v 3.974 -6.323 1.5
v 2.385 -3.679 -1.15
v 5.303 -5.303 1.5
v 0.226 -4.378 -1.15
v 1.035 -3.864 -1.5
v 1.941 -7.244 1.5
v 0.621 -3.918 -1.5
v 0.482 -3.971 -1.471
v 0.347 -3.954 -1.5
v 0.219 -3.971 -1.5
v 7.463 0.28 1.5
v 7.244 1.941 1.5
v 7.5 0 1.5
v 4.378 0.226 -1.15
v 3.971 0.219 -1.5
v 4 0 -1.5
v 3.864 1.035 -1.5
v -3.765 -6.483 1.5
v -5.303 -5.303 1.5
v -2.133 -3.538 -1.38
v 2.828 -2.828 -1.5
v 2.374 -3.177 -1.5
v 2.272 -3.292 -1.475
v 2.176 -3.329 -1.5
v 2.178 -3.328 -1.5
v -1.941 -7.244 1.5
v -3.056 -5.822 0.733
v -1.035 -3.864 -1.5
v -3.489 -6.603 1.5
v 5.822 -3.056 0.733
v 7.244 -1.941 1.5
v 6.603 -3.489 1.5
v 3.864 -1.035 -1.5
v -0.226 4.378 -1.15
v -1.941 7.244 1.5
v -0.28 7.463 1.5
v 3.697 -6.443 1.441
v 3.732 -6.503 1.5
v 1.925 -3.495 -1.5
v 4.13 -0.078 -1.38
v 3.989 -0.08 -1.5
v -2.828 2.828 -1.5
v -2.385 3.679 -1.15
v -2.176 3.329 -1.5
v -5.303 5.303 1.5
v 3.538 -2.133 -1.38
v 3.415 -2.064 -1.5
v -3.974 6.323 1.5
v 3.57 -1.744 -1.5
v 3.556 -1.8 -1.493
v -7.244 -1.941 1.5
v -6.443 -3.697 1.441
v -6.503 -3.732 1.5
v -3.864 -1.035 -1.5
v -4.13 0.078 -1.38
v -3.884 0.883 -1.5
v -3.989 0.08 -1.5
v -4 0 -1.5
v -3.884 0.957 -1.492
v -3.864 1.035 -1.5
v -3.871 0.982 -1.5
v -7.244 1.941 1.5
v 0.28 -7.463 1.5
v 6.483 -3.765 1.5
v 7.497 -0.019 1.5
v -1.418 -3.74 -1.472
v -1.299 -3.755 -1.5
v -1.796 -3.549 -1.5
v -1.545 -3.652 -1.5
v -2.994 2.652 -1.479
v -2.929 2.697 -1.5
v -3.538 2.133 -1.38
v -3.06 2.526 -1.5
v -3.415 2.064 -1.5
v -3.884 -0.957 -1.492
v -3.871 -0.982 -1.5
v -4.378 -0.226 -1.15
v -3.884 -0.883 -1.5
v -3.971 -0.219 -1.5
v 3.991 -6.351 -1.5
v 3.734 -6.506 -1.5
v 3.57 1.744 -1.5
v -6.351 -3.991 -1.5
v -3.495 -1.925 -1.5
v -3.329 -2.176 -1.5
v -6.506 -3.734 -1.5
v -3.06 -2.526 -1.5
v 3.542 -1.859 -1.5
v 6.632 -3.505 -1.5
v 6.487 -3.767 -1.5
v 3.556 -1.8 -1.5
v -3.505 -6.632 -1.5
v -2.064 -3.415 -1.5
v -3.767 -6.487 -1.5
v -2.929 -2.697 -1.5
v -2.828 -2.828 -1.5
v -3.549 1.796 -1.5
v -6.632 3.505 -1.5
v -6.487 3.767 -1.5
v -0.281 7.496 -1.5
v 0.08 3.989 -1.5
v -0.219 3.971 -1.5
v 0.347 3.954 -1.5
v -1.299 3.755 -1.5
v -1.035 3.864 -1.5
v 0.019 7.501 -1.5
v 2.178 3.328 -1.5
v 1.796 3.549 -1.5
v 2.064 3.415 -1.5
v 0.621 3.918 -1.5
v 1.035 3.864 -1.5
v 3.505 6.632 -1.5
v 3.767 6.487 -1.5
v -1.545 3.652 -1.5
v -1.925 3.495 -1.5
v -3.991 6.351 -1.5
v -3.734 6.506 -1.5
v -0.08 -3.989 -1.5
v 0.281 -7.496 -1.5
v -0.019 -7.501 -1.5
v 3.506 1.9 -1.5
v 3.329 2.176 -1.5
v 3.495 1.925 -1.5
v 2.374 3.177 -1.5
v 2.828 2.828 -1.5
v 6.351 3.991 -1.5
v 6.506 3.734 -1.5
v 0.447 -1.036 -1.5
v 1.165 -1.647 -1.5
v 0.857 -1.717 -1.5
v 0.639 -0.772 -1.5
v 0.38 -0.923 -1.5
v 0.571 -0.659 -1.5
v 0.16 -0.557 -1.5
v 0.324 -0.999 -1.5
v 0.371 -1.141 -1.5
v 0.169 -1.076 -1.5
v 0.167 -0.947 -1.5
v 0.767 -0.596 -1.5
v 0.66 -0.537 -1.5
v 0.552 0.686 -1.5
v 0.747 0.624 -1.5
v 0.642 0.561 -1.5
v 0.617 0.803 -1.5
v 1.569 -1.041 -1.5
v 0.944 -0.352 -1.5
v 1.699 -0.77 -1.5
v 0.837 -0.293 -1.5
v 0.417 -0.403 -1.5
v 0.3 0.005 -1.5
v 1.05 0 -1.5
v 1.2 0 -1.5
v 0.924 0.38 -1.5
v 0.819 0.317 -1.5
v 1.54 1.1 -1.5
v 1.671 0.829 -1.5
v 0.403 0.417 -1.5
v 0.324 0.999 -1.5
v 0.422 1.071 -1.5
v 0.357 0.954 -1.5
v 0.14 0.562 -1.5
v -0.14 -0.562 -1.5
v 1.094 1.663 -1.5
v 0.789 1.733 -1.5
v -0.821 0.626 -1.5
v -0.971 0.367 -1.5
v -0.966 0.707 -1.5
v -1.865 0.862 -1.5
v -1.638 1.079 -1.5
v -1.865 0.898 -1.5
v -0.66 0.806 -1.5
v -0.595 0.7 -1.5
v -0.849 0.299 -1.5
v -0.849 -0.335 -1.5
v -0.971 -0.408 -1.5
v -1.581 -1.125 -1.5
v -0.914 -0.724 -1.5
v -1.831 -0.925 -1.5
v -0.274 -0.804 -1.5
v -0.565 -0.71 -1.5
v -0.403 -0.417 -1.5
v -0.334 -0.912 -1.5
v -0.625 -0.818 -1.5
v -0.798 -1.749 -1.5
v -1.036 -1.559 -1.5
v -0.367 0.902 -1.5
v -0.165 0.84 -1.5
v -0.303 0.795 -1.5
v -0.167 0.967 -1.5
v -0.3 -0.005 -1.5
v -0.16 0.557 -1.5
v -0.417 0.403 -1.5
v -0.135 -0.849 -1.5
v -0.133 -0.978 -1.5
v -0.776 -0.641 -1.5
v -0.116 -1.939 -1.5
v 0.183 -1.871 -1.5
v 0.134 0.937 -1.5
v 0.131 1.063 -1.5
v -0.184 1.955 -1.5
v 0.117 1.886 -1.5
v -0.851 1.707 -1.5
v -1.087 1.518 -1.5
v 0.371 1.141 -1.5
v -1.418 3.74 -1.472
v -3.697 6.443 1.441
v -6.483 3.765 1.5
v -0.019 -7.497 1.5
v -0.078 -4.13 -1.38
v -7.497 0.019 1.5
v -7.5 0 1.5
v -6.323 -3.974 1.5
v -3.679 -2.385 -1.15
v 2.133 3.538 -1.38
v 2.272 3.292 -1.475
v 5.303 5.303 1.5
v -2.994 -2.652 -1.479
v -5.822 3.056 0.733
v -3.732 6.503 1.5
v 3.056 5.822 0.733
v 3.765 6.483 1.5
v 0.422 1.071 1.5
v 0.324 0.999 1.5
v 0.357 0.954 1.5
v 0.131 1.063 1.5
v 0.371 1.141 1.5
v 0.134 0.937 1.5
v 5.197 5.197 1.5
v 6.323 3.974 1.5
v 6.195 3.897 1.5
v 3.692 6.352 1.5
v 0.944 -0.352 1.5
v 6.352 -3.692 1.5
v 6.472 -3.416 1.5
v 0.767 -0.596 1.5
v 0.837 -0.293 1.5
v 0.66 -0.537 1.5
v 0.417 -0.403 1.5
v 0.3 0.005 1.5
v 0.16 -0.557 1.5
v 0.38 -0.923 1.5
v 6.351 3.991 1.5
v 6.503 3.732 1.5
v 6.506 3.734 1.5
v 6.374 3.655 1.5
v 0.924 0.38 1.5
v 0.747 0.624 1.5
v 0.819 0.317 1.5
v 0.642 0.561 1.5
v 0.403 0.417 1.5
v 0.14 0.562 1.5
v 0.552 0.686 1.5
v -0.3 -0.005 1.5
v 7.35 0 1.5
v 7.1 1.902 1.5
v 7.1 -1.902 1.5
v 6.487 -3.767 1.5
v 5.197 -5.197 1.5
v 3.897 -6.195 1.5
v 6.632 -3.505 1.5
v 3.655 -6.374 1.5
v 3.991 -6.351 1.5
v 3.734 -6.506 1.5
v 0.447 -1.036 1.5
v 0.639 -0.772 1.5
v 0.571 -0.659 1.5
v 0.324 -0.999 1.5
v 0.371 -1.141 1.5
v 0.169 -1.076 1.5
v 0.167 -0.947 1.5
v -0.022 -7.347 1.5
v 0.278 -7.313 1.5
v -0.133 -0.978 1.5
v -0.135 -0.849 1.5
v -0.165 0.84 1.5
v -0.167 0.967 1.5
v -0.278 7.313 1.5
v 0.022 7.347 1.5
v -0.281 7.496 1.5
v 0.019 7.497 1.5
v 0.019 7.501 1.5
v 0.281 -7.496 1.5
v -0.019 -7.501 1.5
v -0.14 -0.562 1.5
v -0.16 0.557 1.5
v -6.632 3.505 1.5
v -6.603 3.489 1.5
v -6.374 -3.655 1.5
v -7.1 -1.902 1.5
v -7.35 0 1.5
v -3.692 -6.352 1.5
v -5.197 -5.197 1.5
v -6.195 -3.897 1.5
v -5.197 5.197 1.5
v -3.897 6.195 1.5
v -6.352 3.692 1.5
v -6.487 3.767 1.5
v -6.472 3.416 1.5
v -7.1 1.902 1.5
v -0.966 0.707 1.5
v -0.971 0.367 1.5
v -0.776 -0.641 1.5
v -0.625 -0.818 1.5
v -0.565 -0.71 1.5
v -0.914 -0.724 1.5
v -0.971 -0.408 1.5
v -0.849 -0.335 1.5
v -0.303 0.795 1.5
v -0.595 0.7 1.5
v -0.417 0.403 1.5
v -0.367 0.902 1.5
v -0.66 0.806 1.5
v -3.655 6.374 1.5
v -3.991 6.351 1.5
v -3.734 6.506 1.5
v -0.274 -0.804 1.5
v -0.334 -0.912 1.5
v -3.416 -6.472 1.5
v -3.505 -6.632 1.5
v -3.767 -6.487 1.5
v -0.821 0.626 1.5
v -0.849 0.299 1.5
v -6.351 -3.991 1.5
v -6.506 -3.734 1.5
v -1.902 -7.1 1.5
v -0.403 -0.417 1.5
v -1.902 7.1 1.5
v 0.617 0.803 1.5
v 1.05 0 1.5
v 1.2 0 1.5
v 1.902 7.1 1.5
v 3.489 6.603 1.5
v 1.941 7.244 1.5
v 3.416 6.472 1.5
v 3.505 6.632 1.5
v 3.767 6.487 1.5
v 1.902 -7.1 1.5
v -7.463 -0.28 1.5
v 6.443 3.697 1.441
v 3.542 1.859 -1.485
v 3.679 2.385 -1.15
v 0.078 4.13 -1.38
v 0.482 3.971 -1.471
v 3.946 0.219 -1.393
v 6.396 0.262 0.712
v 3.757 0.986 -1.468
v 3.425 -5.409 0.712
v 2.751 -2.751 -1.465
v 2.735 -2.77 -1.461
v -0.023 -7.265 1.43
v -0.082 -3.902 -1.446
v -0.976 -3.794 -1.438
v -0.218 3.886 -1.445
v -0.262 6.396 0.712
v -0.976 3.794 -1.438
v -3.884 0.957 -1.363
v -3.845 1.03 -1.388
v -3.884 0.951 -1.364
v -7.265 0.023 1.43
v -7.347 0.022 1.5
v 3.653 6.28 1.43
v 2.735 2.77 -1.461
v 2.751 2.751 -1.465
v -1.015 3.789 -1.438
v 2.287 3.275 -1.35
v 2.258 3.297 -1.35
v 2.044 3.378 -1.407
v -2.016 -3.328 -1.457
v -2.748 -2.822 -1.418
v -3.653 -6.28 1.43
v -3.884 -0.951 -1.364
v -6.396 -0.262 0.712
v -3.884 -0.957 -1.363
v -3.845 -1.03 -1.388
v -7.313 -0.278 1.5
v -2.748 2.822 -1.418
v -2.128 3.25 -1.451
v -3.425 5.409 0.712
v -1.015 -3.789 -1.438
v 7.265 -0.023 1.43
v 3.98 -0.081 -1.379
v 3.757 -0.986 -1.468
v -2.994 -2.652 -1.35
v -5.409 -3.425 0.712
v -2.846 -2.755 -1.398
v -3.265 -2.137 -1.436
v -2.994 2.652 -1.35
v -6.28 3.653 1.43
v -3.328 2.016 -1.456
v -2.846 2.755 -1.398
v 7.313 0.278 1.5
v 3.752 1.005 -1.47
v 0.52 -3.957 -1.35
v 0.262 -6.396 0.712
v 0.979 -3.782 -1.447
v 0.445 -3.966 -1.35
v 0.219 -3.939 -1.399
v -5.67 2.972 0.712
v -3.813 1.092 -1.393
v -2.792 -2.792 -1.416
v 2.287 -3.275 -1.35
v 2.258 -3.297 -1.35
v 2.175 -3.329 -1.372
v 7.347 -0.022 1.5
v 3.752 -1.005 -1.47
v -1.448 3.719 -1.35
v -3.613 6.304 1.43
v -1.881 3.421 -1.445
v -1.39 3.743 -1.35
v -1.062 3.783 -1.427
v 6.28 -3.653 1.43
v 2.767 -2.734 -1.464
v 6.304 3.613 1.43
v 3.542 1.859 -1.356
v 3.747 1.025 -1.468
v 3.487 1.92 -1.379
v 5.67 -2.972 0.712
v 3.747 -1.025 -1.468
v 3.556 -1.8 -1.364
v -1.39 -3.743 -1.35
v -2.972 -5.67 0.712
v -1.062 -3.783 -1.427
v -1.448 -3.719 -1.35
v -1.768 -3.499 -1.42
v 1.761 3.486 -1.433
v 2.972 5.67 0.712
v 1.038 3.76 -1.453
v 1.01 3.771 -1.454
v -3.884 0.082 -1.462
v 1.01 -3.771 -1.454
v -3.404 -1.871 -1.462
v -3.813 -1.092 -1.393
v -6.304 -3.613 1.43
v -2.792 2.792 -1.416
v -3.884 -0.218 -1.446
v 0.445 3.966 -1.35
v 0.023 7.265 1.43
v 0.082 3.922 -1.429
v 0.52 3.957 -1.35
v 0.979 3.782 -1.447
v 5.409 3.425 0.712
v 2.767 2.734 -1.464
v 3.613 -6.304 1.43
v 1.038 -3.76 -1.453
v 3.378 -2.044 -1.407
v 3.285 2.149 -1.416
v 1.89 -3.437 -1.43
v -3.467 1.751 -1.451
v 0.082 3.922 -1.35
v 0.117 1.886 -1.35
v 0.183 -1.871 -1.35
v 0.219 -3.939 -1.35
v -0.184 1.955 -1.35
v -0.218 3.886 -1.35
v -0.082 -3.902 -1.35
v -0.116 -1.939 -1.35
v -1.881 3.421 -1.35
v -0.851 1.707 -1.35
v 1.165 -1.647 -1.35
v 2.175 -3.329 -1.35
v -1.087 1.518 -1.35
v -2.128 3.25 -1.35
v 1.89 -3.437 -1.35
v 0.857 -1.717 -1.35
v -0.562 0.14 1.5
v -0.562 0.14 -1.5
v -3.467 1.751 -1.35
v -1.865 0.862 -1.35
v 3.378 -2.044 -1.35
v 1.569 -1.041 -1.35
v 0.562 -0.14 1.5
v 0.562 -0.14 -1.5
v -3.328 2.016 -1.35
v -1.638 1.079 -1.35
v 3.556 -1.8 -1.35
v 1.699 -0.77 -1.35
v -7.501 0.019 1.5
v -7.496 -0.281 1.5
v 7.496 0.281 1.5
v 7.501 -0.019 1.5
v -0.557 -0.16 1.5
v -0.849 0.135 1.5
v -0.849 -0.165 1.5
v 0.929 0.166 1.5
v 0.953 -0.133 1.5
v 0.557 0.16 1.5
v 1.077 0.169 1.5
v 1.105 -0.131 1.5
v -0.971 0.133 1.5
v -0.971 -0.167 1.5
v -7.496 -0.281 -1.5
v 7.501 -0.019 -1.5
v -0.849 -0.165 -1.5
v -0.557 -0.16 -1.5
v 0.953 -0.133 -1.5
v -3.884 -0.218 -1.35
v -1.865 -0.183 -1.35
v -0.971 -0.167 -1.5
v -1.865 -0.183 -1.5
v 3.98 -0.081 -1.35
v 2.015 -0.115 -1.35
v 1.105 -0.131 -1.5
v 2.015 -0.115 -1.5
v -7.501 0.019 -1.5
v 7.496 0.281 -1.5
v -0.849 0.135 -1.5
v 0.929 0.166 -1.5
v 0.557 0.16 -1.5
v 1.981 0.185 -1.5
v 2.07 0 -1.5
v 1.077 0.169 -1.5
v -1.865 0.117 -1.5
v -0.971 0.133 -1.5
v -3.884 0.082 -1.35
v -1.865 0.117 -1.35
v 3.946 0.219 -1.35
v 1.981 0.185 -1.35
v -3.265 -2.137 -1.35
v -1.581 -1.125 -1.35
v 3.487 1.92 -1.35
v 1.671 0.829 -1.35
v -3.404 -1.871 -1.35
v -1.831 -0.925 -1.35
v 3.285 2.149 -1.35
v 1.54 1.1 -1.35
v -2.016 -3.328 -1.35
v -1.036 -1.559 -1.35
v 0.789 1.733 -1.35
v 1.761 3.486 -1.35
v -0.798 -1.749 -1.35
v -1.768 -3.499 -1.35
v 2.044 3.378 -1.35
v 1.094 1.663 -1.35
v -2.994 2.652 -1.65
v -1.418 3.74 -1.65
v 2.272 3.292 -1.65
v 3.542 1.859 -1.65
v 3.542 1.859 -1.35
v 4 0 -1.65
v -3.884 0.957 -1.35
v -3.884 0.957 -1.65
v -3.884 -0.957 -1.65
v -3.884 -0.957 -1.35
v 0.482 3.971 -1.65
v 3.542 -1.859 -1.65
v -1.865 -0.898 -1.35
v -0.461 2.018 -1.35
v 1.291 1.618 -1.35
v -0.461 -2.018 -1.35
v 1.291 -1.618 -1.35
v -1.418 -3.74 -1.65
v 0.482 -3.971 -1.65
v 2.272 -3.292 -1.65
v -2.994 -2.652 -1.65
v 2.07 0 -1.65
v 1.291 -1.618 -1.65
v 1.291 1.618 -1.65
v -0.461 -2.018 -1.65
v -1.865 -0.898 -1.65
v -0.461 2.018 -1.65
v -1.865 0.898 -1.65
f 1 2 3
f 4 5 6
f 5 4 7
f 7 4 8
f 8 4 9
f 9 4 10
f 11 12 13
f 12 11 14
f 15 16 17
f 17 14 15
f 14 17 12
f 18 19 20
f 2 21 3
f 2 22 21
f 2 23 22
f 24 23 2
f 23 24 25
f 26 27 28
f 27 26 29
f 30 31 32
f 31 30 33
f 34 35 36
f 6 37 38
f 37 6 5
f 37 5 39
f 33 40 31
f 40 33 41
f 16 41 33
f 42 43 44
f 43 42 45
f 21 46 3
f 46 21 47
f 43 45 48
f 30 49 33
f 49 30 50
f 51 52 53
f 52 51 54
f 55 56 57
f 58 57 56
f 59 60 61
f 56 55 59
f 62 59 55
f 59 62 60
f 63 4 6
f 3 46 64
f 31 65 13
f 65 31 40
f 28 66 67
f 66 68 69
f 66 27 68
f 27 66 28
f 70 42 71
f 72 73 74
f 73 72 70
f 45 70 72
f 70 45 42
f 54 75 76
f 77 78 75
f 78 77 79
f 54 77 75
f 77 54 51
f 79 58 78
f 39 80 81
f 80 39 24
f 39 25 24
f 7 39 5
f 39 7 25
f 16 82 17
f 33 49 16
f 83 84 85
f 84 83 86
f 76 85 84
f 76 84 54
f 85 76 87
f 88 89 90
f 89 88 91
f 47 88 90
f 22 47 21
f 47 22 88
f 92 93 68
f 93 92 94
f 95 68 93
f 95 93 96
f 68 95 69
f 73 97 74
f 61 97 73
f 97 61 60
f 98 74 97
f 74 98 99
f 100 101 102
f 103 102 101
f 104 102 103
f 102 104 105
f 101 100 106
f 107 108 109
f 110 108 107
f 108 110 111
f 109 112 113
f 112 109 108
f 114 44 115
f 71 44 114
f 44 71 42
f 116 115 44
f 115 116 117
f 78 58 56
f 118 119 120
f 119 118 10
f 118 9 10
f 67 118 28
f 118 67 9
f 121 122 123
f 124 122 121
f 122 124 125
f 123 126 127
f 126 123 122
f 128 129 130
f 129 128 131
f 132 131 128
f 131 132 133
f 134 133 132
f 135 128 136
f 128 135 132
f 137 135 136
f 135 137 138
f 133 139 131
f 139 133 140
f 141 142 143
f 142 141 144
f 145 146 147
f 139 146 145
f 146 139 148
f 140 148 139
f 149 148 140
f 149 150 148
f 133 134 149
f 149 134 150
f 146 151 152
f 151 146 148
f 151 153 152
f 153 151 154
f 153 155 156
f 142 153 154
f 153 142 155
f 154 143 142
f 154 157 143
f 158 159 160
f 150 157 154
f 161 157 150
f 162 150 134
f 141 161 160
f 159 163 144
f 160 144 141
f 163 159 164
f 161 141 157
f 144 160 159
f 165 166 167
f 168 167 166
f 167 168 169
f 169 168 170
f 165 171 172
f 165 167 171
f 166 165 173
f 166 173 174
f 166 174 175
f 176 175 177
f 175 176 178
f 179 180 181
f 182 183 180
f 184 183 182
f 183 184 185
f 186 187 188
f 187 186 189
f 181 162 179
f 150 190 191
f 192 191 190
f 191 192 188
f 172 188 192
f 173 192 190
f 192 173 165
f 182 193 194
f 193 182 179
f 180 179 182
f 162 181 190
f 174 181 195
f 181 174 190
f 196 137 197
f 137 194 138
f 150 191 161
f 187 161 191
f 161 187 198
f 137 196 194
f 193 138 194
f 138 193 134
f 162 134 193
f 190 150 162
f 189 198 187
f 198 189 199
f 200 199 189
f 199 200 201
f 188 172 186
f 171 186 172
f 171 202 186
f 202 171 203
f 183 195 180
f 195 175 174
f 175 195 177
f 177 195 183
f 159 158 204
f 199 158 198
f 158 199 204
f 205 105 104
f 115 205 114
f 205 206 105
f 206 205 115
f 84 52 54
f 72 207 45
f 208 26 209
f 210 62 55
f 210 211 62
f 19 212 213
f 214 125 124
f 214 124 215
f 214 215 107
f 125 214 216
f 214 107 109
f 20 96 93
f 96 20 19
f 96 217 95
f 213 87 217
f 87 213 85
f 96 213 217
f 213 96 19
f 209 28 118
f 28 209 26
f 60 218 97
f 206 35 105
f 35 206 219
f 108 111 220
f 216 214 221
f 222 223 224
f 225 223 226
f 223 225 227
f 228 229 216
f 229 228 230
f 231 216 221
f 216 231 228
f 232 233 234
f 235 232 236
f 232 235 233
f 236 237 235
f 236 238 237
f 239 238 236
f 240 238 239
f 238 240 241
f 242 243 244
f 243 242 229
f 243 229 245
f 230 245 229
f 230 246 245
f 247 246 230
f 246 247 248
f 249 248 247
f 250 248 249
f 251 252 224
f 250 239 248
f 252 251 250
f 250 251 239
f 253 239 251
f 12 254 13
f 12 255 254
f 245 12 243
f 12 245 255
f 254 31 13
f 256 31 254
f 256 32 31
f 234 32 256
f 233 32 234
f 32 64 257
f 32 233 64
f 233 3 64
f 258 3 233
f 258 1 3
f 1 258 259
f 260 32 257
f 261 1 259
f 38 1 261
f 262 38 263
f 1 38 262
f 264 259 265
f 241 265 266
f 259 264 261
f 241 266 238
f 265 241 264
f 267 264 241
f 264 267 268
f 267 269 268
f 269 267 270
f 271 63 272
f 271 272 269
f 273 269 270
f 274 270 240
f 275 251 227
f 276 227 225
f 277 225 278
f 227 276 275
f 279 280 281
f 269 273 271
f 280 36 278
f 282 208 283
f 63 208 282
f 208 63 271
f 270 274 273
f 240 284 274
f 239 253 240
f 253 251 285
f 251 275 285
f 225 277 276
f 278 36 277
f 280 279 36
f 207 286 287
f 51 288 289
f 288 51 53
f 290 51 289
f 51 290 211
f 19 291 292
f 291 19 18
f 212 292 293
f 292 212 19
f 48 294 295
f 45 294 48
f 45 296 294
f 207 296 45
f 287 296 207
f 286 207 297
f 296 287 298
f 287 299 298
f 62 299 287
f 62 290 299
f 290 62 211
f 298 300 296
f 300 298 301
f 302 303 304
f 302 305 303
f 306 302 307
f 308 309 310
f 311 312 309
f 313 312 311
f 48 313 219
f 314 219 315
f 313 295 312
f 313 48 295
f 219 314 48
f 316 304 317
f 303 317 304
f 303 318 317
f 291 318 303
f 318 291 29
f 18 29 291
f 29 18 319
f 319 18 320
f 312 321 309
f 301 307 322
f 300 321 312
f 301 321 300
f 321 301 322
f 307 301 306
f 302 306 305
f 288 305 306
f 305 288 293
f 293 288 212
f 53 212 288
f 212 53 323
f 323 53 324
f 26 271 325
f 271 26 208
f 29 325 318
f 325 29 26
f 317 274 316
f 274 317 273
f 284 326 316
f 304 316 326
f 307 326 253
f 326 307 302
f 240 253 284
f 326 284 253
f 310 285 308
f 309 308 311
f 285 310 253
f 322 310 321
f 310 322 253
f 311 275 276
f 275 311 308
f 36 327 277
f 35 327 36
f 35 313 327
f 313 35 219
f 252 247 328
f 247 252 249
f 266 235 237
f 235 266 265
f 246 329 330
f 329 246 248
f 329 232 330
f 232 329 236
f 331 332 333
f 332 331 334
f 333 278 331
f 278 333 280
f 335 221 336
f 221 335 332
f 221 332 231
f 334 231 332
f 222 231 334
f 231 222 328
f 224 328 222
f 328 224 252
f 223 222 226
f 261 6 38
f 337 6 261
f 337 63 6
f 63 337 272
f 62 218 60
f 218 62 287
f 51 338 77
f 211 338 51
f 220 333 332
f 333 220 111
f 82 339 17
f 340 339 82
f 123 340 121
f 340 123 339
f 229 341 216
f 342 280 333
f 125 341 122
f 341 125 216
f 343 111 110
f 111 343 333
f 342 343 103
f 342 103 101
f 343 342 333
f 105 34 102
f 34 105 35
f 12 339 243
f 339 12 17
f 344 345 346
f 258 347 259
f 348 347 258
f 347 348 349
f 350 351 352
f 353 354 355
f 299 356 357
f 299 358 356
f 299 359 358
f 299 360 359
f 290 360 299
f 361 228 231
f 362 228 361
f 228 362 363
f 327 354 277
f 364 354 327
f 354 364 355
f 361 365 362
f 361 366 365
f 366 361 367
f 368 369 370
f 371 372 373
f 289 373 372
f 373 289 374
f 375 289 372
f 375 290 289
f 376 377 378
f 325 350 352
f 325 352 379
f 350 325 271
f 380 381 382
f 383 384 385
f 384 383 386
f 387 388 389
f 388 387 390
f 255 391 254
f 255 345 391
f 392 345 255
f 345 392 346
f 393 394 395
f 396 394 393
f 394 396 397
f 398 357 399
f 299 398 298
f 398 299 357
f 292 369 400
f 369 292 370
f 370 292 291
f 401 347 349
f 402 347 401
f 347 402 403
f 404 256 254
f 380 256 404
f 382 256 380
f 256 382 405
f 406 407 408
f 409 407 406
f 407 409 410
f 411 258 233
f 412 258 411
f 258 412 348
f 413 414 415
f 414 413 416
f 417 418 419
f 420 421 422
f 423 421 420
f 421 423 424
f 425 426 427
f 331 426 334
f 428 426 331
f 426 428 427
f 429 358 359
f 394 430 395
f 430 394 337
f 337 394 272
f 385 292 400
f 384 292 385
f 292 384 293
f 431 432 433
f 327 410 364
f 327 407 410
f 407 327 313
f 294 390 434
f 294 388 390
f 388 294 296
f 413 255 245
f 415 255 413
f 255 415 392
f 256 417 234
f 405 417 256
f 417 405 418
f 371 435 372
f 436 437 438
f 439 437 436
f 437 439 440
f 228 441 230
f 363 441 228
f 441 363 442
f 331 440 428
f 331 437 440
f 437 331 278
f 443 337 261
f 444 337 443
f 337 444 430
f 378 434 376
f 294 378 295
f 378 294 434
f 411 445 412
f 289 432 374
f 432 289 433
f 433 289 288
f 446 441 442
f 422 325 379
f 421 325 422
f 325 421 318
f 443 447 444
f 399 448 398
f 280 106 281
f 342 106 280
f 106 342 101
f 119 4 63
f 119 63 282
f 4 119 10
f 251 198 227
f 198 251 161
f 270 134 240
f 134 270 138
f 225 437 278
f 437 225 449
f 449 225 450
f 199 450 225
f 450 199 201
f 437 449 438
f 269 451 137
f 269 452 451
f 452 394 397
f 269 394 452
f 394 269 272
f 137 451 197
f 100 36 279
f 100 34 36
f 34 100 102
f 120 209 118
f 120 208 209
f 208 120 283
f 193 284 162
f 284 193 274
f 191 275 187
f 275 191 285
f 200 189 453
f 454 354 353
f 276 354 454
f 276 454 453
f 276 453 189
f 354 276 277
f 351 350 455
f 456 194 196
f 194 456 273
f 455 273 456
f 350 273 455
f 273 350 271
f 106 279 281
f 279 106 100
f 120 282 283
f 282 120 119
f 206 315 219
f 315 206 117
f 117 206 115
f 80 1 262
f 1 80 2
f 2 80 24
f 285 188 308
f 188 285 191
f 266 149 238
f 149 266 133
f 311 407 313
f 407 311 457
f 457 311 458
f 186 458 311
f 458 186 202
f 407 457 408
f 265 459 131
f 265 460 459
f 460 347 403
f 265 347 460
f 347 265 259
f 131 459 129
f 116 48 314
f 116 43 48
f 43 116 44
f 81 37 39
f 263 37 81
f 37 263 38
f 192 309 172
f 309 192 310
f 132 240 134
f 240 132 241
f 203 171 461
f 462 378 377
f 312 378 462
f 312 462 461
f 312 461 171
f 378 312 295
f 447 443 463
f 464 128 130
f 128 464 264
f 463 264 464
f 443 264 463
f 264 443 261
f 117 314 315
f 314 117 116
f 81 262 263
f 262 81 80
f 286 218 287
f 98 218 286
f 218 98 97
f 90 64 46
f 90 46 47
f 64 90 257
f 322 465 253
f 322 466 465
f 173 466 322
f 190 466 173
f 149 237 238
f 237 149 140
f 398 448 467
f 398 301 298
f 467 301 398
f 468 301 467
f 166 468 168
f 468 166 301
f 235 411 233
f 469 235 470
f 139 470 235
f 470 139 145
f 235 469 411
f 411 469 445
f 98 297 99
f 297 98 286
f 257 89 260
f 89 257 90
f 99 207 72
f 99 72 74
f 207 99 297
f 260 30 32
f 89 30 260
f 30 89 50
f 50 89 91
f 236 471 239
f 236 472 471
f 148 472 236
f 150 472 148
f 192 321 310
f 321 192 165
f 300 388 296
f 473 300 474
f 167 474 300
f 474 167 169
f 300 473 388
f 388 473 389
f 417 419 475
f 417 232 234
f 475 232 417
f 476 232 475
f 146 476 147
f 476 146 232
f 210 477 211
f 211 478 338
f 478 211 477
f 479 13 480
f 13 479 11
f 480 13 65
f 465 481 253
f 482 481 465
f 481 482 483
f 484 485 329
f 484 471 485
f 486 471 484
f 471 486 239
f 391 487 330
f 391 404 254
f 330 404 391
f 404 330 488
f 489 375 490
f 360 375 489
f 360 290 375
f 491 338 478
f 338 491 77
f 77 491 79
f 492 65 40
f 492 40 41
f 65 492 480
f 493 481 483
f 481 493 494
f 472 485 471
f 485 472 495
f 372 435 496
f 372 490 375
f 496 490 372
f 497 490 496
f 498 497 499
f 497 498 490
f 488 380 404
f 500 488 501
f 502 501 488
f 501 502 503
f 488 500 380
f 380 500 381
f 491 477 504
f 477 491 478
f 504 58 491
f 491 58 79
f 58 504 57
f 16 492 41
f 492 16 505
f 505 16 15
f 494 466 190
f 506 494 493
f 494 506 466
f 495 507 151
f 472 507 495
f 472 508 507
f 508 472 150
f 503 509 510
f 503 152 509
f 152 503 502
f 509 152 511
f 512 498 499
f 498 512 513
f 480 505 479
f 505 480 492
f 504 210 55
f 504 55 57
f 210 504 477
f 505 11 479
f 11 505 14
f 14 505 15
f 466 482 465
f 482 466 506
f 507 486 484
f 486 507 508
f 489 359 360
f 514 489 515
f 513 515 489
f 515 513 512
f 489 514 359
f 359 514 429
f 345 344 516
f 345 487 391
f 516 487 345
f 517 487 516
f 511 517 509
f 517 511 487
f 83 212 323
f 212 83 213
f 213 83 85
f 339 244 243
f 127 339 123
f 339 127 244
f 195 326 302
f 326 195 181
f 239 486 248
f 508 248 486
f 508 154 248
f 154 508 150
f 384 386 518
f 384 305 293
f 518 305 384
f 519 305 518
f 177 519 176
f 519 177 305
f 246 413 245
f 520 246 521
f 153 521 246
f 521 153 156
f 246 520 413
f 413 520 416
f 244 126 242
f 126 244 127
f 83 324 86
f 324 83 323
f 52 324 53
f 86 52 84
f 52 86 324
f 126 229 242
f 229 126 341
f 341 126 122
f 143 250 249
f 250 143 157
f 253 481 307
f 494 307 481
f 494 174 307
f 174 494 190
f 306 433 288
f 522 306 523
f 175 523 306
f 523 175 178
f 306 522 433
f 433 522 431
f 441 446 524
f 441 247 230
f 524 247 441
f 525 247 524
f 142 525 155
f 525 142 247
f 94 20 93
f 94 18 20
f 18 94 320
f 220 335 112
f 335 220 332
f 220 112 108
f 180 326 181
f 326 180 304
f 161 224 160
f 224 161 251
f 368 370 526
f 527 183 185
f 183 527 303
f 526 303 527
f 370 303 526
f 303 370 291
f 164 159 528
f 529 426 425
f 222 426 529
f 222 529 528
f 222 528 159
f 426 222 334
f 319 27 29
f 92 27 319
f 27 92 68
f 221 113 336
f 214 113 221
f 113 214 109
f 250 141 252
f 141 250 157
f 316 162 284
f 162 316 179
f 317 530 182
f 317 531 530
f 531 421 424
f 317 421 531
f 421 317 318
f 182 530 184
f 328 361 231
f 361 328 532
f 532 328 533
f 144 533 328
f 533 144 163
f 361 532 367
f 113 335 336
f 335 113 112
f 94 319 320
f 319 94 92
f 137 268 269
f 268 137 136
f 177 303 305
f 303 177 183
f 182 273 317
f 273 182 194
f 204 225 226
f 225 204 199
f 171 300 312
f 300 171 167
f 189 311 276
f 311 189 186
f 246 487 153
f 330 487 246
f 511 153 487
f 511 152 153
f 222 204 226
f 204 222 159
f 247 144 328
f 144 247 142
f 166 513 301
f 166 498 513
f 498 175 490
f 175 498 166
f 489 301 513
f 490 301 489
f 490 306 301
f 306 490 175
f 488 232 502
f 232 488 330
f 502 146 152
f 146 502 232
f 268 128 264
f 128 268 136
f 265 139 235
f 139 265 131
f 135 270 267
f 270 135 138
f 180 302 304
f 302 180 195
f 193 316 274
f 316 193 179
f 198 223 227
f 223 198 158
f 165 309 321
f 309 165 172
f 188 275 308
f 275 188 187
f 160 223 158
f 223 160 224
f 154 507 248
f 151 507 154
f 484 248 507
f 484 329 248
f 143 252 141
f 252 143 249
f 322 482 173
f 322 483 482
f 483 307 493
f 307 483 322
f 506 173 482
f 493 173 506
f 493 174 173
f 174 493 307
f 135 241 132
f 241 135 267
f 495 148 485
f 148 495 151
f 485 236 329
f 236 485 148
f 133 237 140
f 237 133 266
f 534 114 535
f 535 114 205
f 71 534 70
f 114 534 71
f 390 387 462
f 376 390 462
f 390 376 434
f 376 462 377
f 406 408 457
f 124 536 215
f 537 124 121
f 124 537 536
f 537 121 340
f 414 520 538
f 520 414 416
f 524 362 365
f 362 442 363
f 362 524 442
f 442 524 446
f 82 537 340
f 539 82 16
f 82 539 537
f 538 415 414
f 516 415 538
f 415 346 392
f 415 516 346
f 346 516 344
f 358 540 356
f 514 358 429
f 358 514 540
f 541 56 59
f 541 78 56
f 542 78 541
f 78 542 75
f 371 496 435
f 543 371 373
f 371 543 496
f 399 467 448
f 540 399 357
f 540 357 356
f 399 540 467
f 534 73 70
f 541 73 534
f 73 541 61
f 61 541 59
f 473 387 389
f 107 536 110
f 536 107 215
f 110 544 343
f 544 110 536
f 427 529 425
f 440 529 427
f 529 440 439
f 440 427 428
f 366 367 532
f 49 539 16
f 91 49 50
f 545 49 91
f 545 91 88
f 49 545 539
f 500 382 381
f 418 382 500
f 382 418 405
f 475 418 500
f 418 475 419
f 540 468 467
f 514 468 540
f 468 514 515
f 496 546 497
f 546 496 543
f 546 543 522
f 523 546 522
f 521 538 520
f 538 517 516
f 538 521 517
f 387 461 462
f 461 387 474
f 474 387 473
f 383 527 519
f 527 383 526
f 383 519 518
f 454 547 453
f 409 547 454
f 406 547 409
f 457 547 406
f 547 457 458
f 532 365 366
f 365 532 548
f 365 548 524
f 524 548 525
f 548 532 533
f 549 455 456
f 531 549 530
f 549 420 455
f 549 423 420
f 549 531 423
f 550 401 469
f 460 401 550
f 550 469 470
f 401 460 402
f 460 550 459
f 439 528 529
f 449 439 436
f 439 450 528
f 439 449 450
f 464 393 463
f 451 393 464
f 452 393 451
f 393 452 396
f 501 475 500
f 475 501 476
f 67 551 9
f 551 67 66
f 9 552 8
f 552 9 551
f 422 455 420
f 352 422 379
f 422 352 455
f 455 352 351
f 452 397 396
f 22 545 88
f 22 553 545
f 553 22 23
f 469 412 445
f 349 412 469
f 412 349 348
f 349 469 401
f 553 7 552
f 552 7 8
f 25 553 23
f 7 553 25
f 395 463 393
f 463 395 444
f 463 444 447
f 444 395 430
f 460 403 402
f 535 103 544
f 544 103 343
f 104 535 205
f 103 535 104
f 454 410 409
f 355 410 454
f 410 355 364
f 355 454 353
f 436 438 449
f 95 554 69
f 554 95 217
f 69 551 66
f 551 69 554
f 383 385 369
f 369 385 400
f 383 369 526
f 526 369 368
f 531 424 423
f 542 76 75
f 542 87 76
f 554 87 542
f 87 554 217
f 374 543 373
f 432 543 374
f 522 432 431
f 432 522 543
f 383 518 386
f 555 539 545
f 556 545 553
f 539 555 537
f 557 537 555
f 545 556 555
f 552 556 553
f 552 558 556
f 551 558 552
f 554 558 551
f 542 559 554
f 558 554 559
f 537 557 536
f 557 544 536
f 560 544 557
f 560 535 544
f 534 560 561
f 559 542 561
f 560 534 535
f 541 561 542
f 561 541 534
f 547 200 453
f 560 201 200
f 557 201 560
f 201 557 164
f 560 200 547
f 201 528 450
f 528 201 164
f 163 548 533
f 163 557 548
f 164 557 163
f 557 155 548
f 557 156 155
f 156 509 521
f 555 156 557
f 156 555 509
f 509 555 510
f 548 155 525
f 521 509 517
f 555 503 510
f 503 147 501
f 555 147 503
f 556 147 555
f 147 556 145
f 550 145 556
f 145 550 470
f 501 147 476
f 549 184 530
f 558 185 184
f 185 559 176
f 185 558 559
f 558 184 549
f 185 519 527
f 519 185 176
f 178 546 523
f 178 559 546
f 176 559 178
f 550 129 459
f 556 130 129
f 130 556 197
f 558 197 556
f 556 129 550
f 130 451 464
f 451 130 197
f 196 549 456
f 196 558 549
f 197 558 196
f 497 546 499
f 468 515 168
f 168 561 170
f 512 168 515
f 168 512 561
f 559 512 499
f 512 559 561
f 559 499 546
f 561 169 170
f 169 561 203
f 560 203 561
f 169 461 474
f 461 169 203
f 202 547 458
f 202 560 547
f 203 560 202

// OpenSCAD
thickness = 0.3;
top_diameter = 15;
bottom_diameter = 8;
height = 3;

module plate() {
    difference() {
        cylinder(h=height, d1=bottom_diameter, d2=top_diameter, center=true);
        cylinder(h=height, d1=bottom_diameter-thickness, d2=top_diameter-thickness, center=true);
    }

}

module divider() {
    cube([thickness,top_diameter,height], center=true);
}

module clock() {
    for (i = [1:30:180]) {
        rotate(i,0,0) {
            divider();
        }
    }
}

led_inner = 2.7;
led_outer = 3.84;
led_tolerance = 0.3;

module inner() {
    diameter = led_inner-led_tolerance;
    difference() {
        cylinder(h=height, d=diameter, center=true);
        cylinder(h=height, d=diameter-thickness, center=true);
    }
}

module backplane() {
    translate([0,0,-height/2]){
        difference() {
            cylinder(h=thickness,d=bottom_diameter,center=true);
            cylinder(h=thickness,d=led_outer+led_tolerance,center=true);
        }
    }
}

plate();
clock();
inner();
backplane();
